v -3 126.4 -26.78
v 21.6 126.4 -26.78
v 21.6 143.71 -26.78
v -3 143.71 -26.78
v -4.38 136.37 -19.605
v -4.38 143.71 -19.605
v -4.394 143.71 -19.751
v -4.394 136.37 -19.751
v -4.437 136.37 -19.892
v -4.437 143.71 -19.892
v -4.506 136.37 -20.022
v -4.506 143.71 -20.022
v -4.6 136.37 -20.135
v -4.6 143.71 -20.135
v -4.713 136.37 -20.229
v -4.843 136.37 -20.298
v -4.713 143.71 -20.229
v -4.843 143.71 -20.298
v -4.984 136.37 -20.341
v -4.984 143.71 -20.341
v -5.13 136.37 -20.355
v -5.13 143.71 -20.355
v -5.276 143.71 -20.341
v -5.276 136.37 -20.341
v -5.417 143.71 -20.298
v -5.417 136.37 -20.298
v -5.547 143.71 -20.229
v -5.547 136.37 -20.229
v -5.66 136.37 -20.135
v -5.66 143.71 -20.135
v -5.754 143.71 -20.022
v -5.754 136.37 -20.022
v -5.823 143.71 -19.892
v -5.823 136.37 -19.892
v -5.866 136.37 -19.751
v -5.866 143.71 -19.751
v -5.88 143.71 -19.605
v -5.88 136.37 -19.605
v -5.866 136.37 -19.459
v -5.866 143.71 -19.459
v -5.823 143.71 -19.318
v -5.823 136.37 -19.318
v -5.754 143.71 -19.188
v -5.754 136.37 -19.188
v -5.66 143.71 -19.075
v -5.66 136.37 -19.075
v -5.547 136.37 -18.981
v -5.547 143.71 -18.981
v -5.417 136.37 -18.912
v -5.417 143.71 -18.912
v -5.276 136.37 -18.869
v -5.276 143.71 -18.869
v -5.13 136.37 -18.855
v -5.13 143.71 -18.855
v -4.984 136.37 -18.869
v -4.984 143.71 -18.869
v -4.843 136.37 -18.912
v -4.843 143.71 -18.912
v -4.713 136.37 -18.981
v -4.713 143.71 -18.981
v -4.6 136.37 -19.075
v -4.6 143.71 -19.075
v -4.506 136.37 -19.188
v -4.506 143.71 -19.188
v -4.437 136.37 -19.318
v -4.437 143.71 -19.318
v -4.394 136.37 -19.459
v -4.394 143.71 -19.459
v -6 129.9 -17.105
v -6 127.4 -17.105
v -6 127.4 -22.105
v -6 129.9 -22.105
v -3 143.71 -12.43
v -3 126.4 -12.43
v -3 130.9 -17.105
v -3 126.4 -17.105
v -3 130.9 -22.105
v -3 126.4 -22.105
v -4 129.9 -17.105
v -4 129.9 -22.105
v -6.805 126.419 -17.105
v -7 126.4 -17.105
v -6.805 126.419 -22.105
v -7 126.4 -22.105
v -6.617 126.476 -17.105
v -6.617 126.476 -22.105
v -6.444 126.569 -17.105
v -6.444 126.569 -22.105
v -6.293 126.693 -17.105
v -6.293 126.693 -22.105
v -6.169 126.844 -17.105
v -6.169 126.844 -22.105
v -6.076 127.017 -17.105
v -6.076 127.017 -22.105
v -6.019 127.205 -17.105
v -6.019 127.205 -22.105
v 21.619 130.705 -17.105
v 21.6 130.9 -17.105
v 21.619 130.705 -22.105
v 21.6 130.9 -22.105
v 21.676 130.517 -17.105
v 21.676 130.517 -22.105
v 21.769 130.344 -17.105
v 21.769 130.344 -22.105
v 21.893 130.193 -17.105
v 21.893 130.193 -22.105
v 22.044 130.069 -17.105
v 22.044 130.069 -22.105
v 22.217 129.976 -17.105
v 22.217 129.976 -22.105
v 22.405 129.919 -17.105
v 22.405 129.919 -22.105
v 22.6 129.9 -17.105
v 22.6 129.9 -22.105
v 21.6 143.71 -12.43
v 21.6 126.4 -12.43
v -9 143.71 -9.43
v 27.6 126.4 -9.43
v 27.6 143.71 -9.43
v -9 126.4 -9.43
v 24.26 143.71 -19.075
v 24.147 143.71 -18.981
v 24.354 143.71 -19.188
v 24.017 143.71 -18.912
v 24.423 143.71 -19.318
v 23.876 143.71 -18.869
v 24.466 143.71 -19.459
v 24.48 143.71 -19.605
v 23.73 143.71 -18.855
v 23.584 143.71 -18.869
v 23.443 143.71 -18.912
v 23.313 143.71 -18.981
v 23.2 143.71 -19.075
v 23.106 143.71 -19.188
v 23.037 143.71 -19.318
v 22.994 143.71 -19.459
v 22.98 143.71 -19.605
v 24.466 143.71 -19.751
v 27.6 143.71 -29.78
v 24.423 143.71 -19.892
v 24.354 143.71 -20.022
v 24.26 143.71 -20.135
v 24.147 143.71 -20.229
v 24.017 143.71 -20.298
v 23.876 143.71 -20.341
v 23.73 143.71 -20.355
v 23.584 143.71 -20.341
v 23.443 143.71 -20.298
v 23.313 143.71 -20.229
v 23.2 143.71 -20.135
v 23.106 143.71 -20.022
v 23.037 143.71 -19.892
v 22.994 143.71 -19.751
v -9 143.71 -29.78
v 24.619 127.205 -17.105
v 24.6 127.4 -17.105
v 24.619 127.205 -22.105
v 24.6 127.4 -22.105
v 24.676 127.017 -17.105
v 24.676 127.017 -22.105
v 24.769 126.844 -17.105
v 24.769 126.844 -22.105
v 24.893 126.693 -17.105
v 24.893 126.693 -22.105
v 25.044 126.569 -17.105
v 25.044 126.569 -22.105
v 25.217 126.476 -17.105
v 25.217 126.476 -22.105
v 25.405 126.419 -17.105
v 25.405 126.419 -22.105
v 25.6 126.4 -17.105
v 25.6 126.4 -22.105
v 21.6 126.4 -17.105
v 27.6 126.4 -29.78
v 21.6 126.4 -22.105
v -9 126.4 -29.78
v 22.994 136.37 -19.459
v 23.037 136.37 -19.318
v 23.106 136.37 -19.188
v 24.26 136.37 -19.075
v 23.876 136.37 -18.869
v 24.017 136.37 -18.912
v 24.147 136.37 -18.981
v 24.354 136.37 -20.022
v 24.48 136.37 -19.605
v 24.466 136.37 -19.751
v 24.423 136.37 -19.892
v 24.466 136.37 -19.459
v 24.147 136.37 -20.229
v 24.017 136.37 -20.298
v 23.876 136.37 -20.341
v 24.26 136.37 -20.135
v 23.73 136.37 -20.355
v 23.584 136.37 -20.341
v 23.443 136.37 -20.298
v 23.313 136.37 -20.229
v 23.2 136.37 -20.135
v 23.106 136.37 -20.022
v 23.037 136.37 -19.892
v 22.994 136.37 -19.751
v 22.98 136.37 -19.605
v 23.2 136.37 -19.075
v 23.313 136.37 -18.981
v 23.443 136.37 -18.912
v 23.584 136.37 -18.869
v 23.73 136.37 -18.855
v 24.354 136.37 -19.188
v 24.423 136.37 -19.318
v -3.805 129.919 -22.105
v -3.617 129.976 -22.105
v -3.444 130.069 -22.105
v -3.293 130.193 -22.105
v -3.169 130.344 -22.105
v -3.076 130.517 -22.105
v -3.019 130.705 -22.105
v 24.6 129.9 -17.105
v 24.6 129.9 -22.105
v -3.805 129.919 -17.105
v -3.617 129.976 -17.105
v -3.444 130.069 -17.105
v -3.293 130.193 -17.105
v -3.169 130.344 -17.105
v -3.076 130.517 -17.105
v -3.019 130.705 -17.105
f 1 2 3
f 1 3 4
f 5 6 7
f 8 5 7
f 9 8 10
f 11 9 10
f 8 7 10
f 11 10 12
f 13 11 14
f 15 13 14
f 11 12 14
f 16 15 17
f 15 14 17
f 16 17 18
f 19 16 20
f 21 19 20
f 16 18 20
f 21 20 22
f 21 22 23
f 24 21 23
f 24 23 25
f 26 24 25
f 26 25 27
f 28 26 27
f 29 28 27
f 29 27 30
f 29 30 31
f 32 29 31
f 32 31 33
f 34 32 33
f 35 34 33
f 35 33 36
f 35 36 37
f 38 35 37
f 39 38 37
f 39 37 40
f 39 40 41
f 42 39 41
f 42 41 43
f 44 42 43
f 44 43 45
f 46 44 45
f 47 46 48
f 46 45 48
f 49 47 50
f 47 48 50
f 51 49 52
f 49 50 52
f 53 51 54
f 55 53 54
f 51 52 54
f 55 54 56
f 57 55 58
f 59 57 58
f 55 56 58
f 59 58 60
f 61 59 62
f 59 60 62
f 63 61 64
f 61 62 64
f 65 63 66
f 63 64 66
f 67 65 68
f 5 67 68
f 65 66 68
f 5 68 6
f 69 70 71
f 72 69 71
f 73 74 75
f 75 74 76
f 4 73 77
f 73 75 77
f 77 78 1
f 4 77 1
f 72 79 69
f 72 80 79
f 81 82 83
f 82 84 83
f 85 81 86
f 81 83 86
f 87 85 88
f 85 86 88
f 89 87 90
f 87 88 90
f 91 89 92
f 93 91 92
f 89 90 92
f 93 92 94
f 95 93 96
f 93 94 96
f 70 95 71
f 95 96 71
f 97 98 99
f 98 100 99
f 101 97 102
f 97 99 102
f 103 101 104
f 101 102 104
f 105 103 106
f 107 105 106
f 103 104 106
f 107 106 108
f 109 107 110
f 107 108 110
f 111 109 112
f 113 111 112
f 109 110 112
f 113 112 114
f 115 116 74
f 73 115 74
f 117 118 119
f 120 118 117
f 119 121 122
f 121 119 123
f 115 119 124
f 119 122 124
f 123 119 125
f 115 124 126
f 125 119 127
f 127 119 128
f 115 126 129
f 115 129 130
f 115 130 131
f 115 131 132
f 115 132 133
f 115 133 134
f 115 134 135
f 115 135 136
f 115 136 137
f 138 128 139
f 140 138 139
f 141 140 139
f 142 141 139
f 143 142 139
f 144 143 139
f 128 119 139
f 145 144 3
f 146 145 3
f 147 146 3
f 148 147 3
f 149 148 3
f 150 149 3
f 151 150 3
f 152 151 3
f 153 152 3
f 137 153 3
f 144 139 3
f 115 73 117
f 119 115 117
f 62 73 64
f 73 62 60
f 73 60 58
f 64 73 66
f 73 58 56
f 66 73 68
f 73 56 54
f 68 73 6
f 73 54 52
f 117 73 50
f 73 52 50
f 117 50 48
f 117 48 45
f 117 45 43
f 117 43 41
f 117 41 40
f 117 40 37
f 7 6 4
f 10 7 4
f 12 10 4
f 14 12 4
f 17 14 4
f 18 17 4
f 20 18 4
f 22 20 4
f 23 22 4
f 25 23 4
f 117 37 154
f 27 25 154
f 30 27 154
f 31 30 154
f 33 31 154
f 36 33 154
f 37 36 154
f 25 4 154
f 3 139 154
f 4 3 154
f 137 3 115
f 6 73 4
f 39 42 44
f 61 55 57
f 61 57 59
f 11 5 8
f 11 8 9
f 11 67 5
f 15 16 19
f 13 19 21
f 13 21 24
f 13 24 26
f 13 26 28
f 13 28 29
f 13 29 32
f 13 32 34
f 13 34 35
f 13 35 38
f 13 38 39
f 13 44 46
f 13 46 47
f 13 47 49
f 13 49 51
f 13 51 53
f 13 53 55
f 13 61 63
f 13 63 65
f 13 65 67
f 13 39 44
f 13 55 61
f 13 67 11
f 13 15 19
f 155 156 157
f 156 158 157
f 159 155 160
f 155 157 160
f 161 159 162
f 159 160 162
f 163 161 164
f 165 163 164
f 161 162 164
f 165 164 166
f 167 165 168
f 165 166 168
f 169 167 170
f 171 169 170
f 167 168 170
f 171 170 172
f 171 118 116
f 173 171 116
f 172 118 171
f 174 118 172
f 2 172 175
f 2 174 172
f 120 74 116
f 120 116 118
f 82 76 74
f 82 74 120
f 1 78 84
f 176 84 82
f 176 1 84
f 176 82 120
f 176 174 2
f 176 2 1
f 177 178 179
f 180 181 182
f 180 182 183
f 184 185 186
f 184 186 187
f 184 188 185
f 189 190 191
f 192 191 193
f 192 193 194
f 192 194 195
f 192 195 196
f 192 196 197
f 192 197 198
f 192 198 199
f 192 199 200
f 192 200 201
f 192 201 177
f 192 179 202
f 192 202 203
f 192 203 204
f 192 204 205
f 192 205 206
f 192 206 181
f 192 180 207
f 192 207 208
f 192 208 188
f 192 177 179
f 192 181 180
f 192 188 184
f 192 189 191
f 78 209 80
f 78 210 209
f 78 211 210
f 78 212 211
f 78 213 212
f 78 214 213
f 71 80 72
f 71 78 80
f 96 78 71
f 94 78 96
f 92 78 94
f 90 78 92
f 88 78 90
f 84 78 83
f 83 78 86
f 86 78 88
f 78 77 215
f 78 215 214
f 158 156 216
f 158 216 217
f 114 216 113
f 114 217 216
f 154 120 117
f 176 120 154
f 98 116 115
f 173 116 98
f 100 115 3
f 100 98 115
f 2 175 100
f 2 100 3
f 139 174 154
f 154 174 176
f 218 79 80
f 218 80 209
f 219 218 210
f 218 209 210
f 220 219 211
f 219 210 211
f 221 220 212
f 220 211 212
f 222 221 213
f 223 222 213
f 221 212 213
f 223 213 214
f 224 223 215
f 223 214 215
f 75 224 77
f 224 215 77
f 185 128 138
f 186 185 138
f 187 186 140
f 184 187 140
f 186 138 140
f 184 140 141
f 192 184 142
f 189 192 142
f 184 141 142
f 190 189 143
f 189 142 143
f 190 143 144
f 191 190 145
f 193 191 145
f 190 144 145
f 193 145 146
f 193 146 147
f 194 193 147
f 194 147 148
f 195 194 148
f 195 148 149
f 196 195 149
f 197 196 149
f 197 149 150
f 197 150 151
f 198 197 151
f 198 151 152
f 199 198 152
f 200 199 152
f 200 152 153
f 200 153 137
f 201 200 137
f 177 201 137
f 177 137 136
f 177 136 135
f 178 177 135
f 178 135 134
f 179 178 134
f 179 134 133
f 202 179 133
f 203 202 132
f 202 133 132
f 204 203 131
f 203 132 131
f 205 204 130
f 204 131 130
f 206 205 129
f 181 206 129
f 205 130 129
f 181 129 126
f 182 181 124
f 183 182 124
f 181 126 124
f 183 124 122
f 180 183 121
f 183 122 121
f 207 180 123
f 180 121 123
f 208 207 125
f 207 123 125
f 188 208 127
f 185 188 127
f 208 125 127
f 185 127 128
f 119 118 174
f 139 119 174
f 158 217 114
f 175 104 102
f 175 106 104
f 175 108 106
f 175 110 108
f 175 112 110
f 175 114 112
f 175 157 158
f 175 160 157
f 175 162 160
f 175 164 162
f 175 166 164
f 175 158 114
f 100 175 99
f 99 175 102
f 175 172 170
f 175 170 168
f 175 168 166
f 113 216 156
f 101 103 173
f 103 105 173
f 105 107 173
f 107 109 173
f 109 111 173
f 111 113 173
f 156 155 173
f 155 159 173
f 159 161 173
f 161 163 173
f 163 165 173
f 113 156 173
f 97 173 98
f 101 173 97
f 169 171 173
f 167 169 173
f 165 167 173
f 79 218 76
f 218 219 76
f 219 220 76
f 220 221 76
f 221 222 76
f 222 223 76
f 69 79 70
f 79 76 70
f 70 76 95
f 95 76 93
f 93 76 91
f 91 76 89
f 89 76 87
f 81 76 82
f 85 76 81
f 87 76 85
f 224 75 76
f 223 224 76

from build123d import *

# Parameters (mm, degrees)
SKETCH040_W             = 36.6
SKETCH040_H             = 20.35
SKETCH040_W_2           = 24.6
SKETCH040_H_2           = 14.35
PAD021_DEPTH            = 17.31
SKETCH042_R             = 0.75
POCKET015_DEPTH         = 10
SKETCH041_W             = 3
SKETCH041_H             = 5
POCKET014_DEPTH         = 3.5
FILLET021_R             = 1
FILLET019_R             = 1
FILLET023_R             = 1
FILLET022_R             = 1
BODY010_PLACEMENT_ANGLE = 180


with BuildPart() as part:
    # Sketch040 (on Face1 of ReferencePocket006) → Pad021 (new body)
    with BuildSketch(Plane.XZ):
        with Locations((11.3, 6.175)):
            Rectangle(SKETCH040_W, SKETCH040_H)
        with Locations((11.3, 6.175)):
            Rectangle(SKETCH040_W_2, SKETCH040_H_2, mode=Mode.SUBTRACT)
    extrude(amount=-PAD021_DEPTH)

    # Sketch042 (on Face10 of Pad022) → Pocket015 (cut)
    with BuildSketch(Plane(origin=(0, 19.97, 0), x_dir=(-1, 0, 0), z_dir=(0, 1, 0))):
        with Locations((-25.73, 6.175)):
            Circle(SKETCH042_R)
        with Locations((3.13, 6.175)):
            Circle(SKETCH042_R)
    extrude(amount=-POCKET015_DEPTH, mode=Mode.SUBTRACT)

    # Sketch041 (on Face4 of Pocket015) → Pocket014 (cut)
    with BuildSketch(Plane.XZ):
        with Locations((-2.5, 6.175)):
            Rectangle(SKETCH041_W, SKETCH041_H)
        with Locations((25.1, 6.175)):
            Rectangle(SKETCH041_W, SKETCH041_H)
    extrude(amount=-POCKET014_DEPTH, mode=Mode.SUBTRACT)

    # Fillet021
    fillet021_edges = [part.edges().sort_by_distance(p)[0] for p in [
        (26.6, 0, 6.175),
    ]]
    fillet(fillet021_edges, radius=FILLET021_R)

    # Fillet019
    fillet019_edges = [part.edges().sort_by_distance(p)[0] for p in [
        (23.6, 3.5, 6.175),
    ]]
    fillet(fillet019_edges, radius=FILLET019_R)

    # Fillet023
    fillet023_edges = [part.edges().sort_by_distance(p)[0] for p in [
        (-1, 3.5, 6.175),
    ]]
    fillet(fillet023_edges, radius=FILLET023_R)

    # Fillet022
    fillet022_edges = [part.edges().sort_by_distance(p)[0] for p in [
        (-4, 0, 6.175),
    ]]
    fillet(fillet022_edges, radius=FILLET022_R)


with BuildPart() as part_1:
    # Body010 placement: moved
    add(part.part.moved(Location((20.600001, 126.400008, -13.43))).rotate(Axis((20.600001, 126.400008, -13.43), (0, 1, 0)), BODY010_PLACEMENT_ANGLE))


solid = part_1.part
